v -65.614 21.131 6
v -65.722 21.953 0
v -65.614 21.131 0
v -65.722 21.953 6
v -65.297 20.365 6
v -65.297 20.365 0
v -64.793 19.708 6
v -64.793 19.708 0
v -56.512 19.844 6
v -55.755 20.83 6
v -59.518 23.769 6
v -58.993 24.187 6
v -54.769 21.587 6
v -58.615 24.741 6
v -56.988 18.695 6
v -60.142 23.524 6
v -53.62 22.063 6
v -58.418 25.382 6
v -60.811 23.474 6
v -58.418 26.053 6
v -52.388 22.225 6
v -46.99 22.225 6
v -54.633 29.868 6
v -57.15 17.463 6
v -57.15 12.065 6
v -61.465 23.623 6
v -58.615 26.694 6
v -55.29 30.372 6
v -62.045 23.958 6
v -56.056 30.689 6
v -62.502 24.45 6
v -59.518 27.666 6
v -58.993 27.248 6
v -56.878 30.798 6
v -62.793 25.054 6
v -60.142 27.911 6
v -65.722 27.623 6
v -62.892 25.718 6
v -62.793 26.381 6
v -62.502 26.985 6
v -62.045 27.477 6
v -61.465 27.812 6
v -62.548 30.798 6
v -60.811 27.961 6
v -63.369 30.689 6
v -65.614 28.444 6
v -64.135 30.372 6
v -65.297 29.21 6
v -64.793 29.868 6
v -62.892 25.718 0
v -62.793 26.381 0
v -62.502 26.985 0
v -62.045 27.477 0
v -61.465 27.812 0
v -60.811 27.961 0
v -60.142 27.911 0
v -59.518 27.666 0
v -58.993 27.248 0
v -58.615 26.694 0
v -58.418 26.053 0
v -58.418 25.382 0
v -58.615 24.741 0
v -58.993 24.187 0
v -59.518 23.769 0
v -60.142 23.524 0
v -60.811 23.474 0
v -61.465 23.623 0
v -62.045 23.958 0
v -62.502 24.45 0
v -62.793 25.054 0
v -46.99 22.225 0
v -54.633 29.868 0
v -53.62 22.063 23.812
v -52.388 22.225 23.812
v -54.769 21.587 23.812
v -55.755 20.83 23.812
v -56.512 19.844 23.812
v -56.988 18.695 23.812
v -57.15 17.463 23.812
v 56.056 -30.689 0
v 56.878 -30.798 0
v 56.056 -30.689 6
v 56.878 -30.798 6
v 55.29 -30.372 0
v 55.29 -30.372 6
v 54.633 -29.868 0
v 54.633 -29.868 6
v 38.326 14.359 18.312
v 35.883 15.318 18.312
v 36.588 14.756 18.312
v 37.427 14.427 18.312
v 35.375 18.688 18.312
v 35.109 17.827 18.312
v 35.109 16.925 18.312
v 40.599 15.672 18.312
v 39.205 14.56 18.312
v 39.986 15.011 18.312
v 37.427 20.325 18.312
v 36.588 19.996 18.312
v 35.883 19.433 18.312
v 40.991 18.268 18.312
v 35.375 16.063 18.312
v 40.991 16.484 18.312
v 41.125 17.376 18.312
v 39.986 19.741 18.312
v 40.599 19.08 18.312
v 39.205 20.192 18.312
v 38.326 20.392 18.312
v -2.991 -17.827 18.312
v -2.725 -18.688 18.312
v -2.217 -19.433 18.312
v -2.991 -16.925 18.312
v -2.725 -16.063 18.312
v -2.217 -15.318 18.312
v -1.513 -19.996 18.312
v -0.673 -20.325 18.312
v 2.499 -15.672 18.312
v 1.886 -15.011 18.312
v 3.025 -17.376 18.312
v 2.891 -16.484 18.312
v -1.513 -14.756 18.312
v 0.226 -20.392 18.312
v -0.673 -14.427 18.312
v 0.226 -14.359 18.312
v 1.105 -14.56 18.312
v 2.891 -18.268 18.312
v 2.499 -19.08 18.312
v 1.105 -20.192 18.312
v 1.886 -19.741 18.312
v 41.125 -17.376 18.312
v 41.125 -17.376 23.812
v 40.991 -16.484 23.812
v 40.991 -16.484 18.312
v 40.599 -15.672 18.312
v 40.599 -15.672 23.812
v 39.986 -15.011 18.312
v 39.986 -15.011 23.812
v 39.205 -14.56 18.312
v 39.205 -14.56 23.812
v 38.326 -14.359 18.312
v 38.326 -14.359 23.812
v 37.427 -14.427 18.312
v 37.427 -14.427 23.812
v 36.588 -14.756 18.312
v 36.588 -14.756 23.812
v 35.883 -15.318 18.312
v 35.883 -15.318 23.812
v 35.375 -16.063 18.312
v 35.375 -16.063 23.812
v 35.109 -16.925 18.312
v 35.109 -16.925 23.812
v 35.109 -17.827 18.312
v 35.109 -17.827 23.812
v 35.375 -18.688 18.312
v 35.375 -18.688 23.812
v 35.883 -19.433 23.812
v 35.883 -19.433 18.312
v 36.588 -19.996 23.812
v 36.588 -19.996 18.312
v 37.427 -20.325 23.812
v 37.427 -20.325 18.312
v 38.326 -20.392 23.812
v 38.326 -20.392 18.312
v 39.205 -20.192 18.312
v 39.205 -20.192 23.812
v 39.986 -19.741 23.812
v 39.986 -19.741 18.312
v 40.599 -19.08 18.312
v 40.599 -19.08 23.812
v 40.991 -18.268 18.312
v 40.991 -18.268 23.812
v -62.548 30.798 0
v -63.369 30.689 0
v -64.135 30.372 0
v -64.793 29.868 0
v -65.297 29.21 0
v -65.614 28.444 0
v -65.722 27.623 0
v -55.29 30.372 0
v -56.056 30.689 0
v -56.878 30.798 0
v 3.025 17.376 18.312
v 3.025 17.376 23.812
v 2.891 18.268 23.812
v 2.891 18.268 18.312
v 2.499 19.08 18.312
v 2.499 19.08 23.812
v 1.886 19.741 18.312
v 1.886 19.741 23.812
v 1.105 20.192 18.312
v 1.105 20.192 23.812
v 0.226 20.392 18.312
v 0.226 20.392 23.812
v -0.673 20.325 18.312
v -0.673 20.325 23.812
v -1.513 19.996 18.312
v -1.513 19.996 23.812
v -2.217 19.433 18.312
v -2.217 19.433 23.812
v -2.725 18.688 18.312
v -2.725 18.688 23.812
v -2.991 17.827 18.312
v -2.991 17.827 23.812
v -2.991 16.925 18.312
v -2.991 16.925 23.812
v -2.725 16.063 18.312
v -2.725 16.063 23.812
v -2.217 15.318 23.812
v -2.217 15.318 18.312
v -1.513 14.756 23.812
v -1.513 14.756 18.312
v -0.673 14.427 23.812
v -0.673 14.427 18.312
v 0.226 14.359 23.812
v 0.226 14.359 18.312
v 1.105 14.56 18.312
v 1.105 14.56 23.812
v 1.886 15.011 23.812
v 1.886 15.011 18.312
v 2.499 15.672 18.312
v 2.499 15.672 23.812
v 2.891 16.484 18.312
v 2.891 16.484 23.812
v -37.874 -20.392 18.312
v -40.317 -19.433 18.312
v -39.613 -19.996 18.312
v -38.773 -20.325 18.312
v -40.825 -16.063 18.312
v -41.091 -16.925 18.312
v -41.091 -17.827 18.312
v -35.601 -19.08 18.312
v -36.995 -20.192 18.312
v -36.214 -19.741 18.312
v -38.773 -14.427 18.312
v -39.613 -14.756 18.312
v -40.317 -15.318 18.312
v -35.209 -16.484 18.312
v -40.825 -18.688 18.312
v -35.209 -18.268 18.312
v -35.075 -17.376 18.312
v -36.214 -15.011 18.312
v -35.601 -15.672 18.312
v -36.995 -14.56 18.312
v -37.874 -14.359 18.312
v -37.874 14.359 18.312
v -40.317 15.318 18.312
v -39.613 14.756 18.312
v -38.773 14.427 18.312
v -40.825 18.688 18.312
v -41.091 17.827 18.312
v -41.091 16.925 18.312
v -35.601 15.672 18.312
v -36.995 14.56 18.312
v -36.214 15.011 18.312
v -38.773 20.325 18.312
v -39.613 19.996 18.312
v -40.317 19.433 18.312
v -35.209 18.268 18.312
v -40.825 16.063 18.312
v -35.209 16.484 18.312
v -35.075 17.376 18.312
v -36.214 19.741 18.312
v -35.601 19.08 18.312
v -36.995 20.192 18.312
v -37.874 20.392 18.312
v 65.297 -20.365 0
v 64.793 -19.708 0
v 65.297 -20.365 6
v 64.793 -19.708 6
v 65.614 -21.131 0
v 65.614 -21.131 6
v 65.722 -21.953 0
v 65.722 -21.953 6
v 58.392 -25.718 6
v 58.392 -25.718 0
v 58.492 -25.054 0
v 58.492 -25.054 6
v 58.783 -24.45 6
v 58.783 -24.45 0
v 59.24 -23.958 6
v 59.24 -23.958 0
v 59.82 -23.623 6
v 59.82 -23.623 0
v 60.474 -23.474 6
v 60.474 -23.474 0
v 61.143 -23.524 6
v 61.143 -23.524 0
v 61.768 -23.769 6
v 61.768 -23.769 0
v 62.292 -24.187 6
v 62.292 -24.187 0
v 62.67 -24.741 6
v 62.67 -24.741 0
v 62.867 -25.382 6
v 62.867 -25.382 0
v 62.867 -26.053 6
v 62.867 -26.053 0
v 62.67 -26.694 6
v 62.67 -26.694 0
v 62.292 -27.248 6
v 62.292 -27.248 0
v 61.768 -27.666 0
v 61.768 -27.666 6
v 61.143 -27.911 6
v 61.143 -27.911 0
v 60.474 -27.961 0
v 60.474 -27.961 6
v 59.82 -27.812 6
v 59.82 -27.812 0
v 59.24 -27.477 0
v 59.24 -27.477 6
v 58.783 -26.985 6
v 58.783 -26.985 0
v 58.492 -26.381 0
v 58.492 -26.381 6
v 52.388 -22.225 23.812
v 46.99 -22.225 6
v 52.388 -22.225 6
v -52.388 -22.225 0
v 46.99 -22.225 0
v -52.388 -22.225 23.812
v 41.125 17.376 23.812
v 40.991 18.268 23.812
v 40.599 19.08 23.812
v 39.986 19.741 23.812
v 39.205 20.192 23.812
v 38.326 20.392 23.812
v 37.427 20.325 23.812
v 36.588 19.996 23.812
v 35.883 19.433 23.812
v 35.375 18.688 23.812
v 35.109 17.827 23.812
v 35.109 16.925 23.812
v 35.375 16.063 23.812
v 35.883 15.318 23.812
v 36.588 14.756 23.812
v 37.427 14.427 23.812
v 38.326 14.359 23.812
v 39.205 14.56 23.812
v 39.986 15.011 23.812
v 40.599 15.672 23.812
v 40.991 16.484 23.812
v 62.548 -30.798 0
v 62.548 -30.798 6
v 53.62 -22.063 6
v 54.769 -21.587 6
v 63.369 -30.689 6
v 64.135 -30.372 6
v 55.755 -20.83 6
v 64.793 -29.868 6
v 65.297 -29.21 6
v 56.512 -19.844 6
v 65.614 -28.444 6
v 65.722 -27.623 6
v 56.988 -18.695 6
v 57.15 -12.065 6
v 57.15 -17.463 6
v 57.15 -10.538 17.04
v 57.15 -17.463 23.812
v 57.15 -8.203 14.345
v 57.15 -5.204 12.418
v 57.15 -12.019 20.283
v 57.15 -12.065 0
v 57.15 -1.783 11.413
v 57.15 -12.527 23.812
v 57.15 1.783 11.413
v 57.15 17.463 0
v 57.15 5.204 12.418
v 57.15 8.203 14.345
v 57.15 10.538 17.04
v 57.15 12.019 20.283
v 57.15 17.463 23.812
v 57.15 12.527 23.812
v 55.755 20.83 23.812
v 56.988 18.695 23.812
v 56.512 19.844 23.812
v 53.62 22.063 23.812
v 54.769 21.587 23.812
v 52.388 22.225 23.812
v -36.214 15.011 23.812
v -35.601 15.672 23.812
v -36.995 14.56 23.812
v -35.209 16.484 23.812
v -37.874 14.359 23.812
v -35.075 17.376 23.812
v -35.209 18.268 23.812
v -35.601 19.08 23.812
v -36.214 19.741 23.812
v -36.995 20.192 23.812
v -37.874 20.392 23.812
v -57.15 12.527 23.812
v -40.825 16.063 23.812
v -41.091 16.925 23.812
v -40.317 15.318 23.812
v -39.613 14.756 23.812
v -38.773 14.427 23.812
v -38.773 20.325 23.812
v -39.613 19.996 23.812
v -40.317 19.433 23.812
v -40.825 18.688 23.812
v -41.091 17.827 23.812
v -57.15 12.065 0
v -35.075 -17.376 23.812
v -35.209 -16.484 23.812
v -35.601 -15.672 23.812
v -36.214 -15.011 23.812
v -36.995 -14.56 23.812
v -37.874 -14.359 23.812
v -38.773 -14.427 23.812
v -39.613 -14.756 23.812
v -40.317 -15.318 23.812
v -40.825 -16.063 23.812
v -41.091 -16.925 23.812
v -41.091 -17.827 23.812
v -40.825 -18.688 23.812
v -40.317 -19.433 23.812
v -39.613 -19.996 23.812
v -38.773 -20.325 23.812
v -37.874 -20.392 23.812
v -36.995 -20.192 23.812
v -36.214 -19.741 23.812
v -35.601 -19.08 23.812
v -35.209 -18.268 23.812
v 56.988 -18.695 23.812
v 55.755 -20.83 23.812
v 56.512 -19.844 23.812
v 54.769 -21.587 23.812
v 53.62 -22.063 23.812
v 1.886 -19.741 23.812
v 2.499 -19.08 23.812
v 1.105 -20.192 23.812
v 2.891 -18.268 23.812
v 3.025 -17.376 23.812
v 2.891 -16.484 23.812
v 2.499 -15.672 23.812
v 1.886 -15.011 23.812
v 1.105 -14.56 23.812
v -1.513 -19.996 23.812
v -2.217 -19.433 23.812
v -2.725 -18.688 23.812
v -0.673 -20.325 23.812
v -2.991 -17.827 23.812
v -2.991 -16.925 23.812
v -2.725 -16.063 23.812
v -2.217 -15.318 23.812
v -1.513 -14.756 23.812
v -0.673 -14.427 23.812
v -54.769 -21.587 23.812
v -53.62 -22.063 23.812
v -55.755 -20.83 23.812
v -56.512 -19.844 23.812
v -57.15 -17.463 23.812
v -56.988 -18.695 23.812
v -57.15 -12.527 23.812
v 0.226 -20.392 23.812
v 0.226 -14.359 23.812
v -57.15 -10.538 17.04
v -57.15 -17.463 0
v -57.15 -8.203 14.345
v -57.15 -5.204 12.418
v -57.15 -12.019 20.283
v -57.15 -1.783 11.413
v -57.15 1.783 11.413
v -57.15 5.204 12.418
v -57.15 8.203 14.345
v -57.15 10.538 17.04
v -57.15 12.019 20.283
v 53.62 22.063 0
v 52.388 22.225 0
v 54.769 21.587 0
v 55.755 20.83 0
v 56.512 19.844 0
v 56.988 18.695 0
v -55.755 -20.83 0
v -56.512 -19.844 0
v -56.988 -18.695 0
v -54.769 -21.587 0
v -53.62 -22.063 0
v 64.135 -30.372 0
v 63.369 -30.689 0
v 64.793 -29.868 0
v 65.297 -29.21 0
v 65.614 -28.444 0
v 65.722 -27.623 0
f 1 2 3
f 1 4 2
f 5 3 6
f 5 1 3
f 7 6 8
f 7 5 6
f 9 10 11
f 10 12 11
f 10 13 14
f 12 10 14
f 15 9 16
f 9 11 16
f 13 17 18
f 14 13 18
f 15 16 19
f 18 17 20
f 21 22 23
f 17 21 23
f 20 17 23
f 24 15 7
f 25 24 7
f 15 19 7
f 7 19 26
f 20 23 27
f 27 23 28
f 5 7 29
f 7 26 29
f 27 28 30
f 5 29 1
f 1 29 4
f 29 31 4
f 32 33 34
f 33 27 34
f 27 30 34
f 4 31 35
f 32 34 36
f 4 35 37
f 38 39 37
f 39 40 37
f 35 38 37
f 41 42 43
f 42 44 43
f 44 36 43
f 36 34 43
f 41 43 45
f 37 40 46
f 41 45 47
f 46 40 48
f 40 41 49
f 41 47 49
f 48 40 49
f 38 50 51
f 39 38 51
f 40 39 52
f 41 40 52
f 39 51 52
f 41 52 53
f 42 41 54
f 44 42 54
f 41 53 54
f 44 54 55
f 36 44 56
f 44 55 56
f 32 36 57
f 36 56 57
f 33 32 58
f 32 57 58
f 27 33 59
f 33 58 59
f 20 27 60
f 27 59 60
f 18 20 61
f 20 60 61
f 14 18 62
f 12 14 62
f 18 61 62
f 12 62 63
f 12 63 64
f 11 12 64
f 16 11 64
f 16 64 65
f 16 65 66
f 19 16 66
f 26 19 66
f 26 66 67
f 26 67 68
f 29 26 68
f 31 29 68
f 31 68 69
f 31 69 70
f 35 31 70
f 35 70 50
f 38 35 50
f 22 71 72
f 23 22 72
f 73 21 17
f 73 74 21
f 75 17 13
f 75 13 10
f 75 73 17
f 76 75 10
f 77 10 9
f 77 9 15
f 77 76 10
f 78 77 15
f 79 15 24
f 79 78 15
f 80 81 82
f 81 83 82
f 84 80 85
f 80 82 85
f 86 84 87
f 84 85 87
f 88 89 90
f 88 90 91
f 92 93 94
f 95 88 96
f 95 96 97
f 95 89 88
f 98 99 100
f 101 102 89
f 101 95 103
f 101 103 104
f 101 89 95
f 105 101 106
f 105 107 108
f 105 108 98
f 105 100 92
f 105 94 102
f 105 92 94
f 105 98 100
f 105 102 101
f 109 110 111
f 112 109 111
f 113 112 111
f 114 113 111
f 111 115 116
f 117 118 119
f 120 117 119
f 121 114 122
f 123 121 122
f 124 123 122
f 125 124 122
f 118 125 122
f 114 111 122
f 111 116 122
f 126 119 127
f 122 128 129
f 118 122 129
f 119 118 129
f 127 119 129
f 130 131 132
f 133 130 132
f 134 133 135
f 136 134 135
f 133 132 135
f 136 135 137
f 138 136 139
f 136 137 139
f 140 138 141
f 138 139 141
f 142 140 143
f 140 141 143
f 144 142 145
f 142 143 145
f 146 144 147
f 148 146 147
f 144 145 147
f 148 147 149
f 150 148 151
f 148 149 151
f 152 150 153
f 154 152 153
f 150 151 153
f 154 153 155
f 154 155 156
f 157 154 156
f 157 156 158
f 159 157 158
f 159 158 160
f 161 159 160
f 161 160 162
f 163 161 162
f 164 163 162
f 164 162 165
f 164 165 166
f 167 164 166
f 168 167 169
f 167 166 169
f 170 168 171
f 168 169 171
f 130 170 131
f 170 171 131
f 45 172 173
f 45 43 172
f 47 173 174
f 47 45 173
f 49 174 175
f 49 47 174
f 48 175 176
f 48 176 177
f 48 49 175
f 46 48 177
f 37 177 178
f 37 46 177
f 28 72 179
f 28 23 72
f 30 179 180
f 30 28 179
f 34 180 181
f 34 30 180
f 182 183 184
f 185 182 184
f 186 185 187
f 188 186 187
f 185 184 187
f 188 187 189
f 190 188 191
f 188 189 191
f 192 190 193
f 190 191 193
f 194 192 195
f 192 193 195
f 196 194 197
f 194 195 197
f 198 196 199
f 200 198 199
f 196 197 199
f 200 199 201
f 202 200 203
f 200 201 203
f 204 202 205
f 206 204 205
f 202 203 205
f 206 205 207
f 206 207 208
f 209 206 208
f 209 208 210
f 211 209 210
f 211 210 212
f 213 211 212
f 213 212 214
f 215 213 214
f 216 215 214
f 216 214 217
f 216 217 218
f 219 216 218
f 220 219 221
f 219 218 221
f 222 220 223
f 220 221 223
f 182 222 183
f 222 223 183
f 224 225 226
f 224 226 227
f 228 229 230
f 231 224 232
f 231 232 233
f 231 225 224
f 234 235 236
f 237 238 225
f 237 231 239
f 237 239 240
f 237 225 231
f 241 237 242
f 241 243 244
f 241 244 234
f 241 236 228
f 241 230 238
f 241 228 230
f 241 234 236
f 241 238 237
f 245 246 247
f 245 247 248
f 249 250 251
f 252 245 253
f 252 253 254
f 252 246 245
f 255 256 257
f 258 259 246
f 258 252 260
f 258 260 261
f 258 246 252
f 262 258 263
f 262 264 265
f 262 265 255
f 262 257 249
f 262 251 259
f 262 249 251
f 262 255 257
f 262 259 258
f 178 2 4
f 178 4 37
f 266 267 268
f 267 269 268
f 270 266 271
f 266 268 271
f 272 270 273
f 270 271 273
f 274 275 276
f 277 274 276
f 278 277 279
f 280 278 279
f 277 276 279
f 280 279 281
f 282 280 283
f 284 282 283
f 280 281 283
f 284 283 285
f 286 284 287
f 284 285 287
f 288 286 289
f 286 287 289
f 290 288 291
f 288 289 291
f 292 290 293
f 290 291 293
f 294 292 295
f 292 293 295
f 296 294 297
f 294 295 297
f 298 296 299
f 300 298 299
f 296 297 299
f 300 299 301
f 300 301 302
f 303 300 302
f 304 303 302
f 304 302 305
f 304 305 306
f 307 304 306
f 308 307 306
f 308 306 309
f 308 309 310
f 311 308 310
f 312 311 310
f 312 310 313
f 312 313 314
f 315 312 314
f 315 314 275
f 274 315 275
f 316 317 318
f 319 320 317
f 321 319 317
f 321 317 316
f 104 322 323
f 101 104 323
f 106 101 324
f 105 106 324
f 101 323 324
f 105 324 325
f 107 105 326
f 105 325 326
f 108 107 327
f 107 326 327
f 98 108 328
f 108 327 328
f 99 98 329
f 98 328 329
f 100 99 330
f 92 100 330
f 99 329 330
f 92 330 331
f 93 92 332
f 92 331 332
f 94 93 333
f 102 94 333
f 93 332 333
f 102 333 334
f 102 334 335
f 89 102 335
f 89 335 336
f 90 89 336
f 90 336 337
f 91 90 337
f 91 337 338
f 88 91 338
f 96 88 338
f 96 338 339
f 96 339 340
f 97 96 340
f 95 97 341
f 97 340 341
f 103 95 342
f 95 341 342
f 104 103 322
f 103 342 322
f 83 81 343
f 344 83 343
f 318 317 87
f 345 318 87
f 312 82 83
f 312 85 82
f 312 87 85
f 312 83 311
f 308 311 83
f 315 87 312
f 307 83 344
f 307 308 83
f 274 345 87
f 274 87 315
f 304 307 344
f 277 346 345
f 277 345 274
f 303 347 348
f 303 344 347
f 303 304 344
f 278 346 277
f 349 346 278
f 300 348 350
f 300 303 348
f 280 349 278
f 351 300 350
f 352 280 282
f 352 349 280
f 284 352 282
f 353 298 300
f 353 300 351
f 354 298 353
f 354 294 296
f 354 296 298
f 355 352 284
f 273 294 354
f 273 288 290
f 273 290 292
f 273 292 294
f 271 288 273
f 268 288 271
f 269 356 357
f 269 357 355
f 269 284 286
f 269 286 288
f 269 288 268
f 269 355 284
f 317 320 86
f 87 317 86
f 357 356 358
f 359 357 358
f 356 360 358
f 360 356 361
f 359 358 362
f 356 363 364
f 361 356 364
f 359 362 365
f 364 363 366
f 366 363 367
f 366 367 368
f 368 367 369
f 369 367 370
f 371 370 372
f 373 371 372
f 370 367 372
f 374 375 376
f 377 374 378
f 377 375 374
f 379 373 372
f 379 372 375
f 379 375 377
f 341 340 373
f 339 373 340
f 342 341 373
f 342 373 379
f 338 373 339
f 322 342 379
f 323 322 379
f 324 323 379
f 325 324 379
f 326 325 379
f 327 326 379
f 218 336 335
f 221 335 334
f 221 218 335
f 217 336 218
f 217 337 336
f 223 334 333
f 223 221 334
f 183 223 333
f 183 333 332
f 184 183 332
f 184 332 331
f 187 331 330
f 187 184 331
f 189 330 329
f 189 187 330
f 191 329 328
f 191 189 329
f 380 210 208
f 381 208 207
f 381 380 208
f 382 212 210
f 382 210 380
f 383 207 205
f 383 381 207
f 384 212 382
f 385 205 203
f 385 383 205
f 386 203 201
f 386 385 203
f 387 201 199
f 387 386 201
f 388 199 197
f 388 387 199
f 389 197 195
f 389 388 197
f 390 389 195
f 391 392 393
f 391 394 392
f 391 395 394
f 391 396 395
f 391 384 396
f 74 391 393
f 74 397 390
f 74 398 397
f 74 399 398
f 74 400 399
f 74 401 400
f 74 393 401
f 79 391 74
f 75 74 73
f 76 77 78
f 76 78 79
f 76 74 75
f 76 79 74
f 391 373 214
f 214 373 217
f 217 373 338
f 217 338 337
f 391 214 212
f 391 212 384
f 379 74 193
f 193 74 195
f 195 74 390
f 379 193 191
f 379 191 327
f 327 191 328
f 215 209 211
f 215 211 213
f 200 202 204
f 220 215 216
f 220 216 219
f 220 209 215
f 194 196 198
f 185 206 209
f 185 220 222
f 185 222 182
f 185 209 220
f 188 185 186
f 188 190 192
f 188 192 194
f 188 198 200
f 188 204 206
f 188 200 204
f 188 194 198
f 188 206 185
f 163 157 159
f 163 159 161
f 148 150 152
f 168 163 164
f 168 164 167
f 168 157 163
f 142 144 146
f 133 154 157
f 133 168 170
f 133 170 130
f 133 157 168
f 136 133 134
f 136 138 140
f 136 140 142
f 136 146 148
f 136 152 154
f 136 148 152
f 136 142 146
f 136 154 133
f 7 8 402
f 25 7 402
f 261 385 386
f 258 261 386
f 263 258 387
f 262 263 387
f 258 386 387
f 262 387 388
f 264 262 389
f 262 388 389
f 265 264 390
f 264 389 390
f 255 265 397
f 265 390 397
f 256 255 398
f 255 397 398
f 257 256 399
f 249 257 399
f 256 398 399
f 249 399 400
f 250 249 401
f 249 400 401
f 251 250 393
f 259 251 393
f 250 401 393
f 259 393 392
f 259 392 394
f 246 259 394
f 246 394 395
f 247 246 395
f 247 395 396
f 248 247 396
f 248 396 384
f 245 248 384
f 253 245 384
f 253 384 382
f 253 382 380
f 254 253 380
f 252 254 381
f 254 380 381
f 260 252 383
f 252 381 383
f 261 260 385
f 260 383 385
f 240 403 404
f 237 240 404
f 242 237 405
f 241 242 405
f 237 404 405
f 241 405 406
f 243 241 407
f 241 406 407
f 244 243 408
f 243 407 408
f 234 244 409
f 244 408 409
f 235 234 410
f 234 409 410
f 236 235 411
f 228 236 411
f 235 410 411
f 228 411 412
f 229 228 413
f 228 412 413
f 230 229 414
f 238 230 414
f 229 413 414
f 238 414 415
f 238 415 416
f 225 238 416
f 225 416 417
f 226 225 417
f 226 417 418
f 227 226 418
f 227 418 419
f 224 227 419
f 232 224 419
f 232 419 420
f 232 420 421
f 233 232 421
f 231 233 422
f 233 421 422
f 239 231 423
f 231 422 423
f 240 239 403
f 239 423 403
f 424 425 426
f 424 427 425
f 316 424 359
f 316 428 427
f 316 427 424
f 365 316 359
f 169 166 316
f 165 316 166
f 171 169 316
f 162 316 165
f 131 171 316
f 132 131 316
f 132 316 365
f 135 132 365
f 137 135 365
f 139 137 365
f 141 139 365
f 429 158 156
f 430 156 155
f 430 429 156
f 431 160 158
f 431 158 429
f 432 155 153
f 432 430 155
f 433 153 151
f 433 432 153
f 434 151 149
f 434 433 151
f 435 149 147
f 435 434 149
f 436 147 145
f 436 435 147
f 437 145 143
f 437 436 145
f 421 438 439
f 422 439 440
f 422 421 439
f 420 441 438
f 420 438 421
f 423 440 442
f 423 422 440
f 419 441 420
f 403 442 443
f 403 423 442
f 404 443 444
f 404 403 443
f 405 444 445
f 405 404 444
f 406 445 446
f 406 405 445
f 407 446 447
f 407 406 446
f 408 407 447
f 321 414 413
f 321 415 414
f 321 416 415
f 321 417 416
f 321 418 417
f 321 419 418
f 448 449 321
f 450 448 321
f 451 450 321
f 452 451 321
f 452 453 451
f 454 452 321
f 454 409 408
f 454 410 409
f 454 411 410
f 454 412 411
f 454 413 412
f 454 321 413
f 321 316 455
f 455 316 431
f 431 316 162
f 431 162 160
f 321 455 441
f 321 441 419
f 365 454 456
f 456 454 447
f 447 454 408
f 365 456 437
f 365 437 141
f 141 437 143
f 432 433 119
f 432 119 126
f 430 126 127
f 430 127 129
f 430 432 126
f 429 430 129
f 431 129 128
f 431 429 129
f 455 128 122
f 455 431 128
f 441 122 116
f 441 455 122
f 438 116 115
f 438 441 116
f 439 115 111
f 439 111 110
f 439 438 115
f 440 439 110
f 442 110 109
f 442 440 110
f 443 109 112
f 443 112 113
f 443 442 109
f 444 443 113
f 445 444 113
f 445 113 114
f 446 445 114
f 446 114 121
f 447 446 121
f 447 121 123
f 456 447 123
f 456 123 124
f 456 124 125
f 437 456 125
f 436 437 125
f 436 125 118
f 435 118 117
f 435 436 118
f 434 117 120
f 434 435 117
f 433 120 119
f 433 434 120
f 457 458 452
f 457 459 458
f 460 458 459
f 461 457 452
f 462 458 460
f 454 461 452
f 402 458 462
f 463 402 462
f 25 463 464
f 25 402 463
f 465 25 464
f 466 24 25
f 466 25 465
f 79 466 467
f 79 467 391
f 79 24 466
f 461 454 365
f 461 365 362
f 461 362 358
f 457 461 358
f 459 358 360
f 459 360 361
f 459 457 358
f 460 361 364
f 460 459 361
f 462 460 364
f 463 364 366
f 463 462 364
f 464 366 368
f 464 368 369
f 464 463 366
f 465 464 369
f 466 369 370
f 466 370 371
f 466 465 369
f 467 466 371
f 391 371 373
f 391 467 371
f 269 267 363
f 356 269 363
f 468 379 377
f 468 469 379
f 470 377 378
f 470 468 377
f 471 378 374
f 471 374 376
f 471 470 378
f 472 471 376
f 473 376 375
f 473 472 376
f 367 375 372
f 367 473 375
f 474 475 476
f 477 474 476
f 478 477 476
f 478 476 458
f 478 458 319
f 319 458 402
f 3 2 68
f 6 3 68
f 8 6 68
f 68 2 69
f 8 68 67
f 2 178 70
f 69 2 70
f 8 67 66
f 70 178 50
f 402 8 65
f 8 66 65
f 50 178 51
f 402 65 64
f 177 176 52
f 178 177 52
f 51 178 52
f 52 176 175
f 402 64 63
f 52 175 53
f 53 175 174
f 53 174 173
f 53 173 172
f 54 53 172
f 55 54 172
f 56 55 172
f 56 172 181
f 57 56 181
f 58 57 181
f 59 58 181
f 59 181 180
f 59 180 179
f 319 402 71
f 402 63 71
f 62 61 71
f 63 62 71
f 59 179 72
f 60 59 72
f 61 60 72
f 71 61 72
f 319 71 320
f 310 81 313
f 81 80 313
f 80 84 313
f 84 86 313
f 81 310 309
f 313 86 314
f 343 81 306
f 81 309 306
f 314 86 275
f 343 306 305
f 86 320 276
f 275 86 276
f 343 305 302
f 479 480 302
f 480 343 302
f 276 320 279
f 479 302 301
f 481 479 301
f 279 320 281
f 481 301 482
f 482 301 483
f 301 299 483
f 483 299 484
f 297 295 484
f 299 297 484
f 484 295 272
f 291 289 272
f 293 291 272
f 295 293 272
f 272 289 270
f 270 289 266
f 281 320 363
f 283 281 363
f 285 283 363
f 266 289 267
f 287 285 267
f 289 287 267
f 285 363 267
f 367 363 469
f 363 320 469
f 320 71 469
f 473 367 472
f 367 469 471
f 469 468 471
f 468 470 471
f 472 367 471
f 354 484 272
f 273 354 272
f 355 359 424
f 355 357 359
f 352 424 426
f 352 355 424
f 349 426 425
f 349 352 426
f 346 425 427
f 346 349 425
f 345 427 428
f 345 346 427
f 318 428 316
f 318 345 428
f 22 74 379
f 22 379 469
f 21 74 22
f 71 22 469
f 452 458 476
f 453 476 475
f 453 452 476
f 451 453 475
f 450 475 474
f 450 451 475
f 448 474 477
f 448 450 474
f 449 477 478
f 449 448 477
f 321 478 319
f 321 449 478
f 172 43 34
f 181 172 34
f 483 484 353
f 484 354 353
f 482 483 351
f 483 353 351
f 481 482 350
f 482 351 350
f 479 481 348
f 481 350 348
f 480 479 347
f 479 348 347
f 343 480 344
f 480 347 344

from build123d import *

# Parameters (mm, degrees)
SKETCH1_W               = 114.3
SKETCH1_H               = 44.45
BOSS_EXTRUDE1_DEPTH     = 5
BOSS_EXTRUDE2_DEPTH     = 114.3
SKETCH3_R               = 3.025
CUT_EXTRUDE1_DEPTH      = 5.5
LPATTERN1_COUNT         = 2
LPATTERN1_PITCH         = 38.1
LPATTERN1_COL_COUNT     = 2
LPATTERN1_COL_PITCH     = 38.1
MIRROR1_COPY_1_SKETCH_R = 3.025
MIRROR1_COPY_1_DEPTH    = 5.5
MIRROR1_COPY_2_SKETCH_R = 3.025
MIRROR1_COPY_2_DEPTH    = 5.5
SKETCH4_W               = 10.16
SKETCH4_H               = 10.16
BOSS_EXTRUDE3_DEPTH     = 6
M4_CLEARANCE_HOLE1_D    = 4.5
FILLET3_R               = 3.175
FILLET4_R               = 4.7625


with BuildPart() as part:
    # Sketch1 → Boss-Extrude1 (new body)
    with BuildSketch(Plane.XY):
        Rectangle(SKETCH1_W, SKETCH1_H)
    extrude(amount=BOSS_EXTRUDE1_DEPTH)

    # Sketch2 → Boss-Extrude2 (add)
    with BuildSketch(Plane.ZY.offset(57.15)):
        with BuildLine():
            Line((23.8125, 22.225), (5, 22.225))
            Line((5, 22.225), (5, -22.225))
            Line((5, -22.225), (23.8125, -22.225))
            Line((23.8125, -22.225), (23.8125, -12.5269))
            ThreePointArc((23.8125, -12.5269), (11.2856, 0), (23.8125, 12.5269))
            Line((23.8125, 12.5269), (23.8125, 22.225))
        make_face()
    extrude(amount=-BOSS_EXTRUDE2_DEPTH)

    # Sketch3 → Cut-Extrude1 (cut)
    with BuildSketch(Plane.XY.offset(23.8125)):
        with Locations((0, 17.37595)):
            Circle(SKETCH3_R)
    cut_extrude1 = extrude(amount=-CUT_EXTRUDE1_DEPTH, mode=Mode.SUBTRACT)

    # LPattern1: Cut-Extrude1 ×2
    with Locations(*[(i * LPATTERN1_PITCH, 0, 0) for i in range(1, LPATTERN1_COUNT)]):
        add(cut_extrude1, mode=Mode.SUBTRACT)

    # LPattern1 col: Cut-Extrude1 ×2
    with Locations(*[(-i * LPATTERN1_COL_PITCH, 0, 0) for i in range(1, LPATTERN1_COL_COUNT)]):
        add(cut_extrude1, mode=Mode.SUBTRACT)

    # Mirror1: Cut-Extrude1 across plane
    add(cut_extrude1.mirror(Plane.ZX), mode=Mode.SUBTRACT)

    # Mirror1 copy 1 sketch → Mirror1 copy 1 (cut)
    with BuildSketch(Plane(origin=(38.1, 0, 23.8125), x_dir=(1, 0, 0), z_dir=(0, 0, 1))):
        with Locations((0, -17.37595)):
            Circle(MIRROR1_COPY_1_SKETCH_R)
    extrude(amount=-MIRROR1_COPY_1_DEPTH, mode=Mode.SUBTRACT)

    # Mirror1 copy 2 sketch → Mirror1 copy 2 (cut)
    with BuildSketch(Plane(origin=(-38.1, 0, 23.8125), x_dir=(1, 0, 0), z_dir=(0, 0, 1))):
        with Locations((0, -17.37595)):
            Circle(MIRROR1_COPY_2_SKETCH_R)
    extrude(amount=-MIRROR1_COPY_2_DEPTH, mode=Mode.SUBTRACT)

    # Sketch4 → Boss-Extrude3 (add)
    with BuildSketch(Plane.XY):
        Polygon((-65.7225, 30.7975), (-55.5625, 20.6375), (-65.7225, 20.6375), align=None)
        Polygon((-65.7225, 30.7975), (-55.5625, 30.7975), (-55.5625, 20.6375), align=None)
        with Locations((60.6425, -25.7175)):
            Rectangle(SKETCH4_W, SKETCH4_H)
        Polygon((-55.5625, 30.7975), (-60.6425, 25.7175), (-57.15, 22.225), (-55.5625, 22.225), align=None)
        Polygon((-46.99, 22.225), (-55.5625, 30.7975), (-55.5625, 22.225), align=None)
        Polygon((-60.6425, 25.7175), (-65.7225, 20.6375), (-57.15, 20.6375), (-57.15, 22.225), align=None)
        Polygon((-57.15, 20.6375), (-65.7225, 20.6375), (-57.15, 12.065), align=None)
        Polygon((57.15, -20.6375), (65.7225, -20.6375), (57.15, -12.065), align=None)
        Polygon((46.99, -22.225), (55.5625, -30.7975), (55.5625, -22.225), align=None)
    extrude(amount=BOSS_EXTRUDE3_DEPTH)

    # M4 Clearance Hole1 (through all)
    with Locations(Plane.XY.offset(6)):
        with Locations((-60.6425, 25.7175), (60.6425, -25.7175)):
            Hole(M4_CLEARANCE_HOLE1_D / 2)

    # Fillet3
    fillet3_edges = [part.edges().sort_by_distance(p)[0] for p in [
        (-55.5625, 30.7975, 3),
        (-65.7225, 30.7975, 3),
        (-65.7225, 20.6375, 3),
        (55.5625, -30.7975, 3),
        (65.7225, -30.7975, 3),
        (65.7225, -20.6375, 3),
    ]]
    fillet(fillet3_edges, radius=FILLET3_R)

    # Fillet4
    fillet4_edges = [part.edges().sort_by_distance(p)[0] for p in [
        (57.15, -22.225, 14.90625),
        (-57.15, -22.225, 11.90625),
        (-57.15, 22.225, 14.90625),
        (57.15, 22.225, 11.90625),
    ]]
    fillet(fillet4_edges, radius=FILLET4_R)


solid = part.part
